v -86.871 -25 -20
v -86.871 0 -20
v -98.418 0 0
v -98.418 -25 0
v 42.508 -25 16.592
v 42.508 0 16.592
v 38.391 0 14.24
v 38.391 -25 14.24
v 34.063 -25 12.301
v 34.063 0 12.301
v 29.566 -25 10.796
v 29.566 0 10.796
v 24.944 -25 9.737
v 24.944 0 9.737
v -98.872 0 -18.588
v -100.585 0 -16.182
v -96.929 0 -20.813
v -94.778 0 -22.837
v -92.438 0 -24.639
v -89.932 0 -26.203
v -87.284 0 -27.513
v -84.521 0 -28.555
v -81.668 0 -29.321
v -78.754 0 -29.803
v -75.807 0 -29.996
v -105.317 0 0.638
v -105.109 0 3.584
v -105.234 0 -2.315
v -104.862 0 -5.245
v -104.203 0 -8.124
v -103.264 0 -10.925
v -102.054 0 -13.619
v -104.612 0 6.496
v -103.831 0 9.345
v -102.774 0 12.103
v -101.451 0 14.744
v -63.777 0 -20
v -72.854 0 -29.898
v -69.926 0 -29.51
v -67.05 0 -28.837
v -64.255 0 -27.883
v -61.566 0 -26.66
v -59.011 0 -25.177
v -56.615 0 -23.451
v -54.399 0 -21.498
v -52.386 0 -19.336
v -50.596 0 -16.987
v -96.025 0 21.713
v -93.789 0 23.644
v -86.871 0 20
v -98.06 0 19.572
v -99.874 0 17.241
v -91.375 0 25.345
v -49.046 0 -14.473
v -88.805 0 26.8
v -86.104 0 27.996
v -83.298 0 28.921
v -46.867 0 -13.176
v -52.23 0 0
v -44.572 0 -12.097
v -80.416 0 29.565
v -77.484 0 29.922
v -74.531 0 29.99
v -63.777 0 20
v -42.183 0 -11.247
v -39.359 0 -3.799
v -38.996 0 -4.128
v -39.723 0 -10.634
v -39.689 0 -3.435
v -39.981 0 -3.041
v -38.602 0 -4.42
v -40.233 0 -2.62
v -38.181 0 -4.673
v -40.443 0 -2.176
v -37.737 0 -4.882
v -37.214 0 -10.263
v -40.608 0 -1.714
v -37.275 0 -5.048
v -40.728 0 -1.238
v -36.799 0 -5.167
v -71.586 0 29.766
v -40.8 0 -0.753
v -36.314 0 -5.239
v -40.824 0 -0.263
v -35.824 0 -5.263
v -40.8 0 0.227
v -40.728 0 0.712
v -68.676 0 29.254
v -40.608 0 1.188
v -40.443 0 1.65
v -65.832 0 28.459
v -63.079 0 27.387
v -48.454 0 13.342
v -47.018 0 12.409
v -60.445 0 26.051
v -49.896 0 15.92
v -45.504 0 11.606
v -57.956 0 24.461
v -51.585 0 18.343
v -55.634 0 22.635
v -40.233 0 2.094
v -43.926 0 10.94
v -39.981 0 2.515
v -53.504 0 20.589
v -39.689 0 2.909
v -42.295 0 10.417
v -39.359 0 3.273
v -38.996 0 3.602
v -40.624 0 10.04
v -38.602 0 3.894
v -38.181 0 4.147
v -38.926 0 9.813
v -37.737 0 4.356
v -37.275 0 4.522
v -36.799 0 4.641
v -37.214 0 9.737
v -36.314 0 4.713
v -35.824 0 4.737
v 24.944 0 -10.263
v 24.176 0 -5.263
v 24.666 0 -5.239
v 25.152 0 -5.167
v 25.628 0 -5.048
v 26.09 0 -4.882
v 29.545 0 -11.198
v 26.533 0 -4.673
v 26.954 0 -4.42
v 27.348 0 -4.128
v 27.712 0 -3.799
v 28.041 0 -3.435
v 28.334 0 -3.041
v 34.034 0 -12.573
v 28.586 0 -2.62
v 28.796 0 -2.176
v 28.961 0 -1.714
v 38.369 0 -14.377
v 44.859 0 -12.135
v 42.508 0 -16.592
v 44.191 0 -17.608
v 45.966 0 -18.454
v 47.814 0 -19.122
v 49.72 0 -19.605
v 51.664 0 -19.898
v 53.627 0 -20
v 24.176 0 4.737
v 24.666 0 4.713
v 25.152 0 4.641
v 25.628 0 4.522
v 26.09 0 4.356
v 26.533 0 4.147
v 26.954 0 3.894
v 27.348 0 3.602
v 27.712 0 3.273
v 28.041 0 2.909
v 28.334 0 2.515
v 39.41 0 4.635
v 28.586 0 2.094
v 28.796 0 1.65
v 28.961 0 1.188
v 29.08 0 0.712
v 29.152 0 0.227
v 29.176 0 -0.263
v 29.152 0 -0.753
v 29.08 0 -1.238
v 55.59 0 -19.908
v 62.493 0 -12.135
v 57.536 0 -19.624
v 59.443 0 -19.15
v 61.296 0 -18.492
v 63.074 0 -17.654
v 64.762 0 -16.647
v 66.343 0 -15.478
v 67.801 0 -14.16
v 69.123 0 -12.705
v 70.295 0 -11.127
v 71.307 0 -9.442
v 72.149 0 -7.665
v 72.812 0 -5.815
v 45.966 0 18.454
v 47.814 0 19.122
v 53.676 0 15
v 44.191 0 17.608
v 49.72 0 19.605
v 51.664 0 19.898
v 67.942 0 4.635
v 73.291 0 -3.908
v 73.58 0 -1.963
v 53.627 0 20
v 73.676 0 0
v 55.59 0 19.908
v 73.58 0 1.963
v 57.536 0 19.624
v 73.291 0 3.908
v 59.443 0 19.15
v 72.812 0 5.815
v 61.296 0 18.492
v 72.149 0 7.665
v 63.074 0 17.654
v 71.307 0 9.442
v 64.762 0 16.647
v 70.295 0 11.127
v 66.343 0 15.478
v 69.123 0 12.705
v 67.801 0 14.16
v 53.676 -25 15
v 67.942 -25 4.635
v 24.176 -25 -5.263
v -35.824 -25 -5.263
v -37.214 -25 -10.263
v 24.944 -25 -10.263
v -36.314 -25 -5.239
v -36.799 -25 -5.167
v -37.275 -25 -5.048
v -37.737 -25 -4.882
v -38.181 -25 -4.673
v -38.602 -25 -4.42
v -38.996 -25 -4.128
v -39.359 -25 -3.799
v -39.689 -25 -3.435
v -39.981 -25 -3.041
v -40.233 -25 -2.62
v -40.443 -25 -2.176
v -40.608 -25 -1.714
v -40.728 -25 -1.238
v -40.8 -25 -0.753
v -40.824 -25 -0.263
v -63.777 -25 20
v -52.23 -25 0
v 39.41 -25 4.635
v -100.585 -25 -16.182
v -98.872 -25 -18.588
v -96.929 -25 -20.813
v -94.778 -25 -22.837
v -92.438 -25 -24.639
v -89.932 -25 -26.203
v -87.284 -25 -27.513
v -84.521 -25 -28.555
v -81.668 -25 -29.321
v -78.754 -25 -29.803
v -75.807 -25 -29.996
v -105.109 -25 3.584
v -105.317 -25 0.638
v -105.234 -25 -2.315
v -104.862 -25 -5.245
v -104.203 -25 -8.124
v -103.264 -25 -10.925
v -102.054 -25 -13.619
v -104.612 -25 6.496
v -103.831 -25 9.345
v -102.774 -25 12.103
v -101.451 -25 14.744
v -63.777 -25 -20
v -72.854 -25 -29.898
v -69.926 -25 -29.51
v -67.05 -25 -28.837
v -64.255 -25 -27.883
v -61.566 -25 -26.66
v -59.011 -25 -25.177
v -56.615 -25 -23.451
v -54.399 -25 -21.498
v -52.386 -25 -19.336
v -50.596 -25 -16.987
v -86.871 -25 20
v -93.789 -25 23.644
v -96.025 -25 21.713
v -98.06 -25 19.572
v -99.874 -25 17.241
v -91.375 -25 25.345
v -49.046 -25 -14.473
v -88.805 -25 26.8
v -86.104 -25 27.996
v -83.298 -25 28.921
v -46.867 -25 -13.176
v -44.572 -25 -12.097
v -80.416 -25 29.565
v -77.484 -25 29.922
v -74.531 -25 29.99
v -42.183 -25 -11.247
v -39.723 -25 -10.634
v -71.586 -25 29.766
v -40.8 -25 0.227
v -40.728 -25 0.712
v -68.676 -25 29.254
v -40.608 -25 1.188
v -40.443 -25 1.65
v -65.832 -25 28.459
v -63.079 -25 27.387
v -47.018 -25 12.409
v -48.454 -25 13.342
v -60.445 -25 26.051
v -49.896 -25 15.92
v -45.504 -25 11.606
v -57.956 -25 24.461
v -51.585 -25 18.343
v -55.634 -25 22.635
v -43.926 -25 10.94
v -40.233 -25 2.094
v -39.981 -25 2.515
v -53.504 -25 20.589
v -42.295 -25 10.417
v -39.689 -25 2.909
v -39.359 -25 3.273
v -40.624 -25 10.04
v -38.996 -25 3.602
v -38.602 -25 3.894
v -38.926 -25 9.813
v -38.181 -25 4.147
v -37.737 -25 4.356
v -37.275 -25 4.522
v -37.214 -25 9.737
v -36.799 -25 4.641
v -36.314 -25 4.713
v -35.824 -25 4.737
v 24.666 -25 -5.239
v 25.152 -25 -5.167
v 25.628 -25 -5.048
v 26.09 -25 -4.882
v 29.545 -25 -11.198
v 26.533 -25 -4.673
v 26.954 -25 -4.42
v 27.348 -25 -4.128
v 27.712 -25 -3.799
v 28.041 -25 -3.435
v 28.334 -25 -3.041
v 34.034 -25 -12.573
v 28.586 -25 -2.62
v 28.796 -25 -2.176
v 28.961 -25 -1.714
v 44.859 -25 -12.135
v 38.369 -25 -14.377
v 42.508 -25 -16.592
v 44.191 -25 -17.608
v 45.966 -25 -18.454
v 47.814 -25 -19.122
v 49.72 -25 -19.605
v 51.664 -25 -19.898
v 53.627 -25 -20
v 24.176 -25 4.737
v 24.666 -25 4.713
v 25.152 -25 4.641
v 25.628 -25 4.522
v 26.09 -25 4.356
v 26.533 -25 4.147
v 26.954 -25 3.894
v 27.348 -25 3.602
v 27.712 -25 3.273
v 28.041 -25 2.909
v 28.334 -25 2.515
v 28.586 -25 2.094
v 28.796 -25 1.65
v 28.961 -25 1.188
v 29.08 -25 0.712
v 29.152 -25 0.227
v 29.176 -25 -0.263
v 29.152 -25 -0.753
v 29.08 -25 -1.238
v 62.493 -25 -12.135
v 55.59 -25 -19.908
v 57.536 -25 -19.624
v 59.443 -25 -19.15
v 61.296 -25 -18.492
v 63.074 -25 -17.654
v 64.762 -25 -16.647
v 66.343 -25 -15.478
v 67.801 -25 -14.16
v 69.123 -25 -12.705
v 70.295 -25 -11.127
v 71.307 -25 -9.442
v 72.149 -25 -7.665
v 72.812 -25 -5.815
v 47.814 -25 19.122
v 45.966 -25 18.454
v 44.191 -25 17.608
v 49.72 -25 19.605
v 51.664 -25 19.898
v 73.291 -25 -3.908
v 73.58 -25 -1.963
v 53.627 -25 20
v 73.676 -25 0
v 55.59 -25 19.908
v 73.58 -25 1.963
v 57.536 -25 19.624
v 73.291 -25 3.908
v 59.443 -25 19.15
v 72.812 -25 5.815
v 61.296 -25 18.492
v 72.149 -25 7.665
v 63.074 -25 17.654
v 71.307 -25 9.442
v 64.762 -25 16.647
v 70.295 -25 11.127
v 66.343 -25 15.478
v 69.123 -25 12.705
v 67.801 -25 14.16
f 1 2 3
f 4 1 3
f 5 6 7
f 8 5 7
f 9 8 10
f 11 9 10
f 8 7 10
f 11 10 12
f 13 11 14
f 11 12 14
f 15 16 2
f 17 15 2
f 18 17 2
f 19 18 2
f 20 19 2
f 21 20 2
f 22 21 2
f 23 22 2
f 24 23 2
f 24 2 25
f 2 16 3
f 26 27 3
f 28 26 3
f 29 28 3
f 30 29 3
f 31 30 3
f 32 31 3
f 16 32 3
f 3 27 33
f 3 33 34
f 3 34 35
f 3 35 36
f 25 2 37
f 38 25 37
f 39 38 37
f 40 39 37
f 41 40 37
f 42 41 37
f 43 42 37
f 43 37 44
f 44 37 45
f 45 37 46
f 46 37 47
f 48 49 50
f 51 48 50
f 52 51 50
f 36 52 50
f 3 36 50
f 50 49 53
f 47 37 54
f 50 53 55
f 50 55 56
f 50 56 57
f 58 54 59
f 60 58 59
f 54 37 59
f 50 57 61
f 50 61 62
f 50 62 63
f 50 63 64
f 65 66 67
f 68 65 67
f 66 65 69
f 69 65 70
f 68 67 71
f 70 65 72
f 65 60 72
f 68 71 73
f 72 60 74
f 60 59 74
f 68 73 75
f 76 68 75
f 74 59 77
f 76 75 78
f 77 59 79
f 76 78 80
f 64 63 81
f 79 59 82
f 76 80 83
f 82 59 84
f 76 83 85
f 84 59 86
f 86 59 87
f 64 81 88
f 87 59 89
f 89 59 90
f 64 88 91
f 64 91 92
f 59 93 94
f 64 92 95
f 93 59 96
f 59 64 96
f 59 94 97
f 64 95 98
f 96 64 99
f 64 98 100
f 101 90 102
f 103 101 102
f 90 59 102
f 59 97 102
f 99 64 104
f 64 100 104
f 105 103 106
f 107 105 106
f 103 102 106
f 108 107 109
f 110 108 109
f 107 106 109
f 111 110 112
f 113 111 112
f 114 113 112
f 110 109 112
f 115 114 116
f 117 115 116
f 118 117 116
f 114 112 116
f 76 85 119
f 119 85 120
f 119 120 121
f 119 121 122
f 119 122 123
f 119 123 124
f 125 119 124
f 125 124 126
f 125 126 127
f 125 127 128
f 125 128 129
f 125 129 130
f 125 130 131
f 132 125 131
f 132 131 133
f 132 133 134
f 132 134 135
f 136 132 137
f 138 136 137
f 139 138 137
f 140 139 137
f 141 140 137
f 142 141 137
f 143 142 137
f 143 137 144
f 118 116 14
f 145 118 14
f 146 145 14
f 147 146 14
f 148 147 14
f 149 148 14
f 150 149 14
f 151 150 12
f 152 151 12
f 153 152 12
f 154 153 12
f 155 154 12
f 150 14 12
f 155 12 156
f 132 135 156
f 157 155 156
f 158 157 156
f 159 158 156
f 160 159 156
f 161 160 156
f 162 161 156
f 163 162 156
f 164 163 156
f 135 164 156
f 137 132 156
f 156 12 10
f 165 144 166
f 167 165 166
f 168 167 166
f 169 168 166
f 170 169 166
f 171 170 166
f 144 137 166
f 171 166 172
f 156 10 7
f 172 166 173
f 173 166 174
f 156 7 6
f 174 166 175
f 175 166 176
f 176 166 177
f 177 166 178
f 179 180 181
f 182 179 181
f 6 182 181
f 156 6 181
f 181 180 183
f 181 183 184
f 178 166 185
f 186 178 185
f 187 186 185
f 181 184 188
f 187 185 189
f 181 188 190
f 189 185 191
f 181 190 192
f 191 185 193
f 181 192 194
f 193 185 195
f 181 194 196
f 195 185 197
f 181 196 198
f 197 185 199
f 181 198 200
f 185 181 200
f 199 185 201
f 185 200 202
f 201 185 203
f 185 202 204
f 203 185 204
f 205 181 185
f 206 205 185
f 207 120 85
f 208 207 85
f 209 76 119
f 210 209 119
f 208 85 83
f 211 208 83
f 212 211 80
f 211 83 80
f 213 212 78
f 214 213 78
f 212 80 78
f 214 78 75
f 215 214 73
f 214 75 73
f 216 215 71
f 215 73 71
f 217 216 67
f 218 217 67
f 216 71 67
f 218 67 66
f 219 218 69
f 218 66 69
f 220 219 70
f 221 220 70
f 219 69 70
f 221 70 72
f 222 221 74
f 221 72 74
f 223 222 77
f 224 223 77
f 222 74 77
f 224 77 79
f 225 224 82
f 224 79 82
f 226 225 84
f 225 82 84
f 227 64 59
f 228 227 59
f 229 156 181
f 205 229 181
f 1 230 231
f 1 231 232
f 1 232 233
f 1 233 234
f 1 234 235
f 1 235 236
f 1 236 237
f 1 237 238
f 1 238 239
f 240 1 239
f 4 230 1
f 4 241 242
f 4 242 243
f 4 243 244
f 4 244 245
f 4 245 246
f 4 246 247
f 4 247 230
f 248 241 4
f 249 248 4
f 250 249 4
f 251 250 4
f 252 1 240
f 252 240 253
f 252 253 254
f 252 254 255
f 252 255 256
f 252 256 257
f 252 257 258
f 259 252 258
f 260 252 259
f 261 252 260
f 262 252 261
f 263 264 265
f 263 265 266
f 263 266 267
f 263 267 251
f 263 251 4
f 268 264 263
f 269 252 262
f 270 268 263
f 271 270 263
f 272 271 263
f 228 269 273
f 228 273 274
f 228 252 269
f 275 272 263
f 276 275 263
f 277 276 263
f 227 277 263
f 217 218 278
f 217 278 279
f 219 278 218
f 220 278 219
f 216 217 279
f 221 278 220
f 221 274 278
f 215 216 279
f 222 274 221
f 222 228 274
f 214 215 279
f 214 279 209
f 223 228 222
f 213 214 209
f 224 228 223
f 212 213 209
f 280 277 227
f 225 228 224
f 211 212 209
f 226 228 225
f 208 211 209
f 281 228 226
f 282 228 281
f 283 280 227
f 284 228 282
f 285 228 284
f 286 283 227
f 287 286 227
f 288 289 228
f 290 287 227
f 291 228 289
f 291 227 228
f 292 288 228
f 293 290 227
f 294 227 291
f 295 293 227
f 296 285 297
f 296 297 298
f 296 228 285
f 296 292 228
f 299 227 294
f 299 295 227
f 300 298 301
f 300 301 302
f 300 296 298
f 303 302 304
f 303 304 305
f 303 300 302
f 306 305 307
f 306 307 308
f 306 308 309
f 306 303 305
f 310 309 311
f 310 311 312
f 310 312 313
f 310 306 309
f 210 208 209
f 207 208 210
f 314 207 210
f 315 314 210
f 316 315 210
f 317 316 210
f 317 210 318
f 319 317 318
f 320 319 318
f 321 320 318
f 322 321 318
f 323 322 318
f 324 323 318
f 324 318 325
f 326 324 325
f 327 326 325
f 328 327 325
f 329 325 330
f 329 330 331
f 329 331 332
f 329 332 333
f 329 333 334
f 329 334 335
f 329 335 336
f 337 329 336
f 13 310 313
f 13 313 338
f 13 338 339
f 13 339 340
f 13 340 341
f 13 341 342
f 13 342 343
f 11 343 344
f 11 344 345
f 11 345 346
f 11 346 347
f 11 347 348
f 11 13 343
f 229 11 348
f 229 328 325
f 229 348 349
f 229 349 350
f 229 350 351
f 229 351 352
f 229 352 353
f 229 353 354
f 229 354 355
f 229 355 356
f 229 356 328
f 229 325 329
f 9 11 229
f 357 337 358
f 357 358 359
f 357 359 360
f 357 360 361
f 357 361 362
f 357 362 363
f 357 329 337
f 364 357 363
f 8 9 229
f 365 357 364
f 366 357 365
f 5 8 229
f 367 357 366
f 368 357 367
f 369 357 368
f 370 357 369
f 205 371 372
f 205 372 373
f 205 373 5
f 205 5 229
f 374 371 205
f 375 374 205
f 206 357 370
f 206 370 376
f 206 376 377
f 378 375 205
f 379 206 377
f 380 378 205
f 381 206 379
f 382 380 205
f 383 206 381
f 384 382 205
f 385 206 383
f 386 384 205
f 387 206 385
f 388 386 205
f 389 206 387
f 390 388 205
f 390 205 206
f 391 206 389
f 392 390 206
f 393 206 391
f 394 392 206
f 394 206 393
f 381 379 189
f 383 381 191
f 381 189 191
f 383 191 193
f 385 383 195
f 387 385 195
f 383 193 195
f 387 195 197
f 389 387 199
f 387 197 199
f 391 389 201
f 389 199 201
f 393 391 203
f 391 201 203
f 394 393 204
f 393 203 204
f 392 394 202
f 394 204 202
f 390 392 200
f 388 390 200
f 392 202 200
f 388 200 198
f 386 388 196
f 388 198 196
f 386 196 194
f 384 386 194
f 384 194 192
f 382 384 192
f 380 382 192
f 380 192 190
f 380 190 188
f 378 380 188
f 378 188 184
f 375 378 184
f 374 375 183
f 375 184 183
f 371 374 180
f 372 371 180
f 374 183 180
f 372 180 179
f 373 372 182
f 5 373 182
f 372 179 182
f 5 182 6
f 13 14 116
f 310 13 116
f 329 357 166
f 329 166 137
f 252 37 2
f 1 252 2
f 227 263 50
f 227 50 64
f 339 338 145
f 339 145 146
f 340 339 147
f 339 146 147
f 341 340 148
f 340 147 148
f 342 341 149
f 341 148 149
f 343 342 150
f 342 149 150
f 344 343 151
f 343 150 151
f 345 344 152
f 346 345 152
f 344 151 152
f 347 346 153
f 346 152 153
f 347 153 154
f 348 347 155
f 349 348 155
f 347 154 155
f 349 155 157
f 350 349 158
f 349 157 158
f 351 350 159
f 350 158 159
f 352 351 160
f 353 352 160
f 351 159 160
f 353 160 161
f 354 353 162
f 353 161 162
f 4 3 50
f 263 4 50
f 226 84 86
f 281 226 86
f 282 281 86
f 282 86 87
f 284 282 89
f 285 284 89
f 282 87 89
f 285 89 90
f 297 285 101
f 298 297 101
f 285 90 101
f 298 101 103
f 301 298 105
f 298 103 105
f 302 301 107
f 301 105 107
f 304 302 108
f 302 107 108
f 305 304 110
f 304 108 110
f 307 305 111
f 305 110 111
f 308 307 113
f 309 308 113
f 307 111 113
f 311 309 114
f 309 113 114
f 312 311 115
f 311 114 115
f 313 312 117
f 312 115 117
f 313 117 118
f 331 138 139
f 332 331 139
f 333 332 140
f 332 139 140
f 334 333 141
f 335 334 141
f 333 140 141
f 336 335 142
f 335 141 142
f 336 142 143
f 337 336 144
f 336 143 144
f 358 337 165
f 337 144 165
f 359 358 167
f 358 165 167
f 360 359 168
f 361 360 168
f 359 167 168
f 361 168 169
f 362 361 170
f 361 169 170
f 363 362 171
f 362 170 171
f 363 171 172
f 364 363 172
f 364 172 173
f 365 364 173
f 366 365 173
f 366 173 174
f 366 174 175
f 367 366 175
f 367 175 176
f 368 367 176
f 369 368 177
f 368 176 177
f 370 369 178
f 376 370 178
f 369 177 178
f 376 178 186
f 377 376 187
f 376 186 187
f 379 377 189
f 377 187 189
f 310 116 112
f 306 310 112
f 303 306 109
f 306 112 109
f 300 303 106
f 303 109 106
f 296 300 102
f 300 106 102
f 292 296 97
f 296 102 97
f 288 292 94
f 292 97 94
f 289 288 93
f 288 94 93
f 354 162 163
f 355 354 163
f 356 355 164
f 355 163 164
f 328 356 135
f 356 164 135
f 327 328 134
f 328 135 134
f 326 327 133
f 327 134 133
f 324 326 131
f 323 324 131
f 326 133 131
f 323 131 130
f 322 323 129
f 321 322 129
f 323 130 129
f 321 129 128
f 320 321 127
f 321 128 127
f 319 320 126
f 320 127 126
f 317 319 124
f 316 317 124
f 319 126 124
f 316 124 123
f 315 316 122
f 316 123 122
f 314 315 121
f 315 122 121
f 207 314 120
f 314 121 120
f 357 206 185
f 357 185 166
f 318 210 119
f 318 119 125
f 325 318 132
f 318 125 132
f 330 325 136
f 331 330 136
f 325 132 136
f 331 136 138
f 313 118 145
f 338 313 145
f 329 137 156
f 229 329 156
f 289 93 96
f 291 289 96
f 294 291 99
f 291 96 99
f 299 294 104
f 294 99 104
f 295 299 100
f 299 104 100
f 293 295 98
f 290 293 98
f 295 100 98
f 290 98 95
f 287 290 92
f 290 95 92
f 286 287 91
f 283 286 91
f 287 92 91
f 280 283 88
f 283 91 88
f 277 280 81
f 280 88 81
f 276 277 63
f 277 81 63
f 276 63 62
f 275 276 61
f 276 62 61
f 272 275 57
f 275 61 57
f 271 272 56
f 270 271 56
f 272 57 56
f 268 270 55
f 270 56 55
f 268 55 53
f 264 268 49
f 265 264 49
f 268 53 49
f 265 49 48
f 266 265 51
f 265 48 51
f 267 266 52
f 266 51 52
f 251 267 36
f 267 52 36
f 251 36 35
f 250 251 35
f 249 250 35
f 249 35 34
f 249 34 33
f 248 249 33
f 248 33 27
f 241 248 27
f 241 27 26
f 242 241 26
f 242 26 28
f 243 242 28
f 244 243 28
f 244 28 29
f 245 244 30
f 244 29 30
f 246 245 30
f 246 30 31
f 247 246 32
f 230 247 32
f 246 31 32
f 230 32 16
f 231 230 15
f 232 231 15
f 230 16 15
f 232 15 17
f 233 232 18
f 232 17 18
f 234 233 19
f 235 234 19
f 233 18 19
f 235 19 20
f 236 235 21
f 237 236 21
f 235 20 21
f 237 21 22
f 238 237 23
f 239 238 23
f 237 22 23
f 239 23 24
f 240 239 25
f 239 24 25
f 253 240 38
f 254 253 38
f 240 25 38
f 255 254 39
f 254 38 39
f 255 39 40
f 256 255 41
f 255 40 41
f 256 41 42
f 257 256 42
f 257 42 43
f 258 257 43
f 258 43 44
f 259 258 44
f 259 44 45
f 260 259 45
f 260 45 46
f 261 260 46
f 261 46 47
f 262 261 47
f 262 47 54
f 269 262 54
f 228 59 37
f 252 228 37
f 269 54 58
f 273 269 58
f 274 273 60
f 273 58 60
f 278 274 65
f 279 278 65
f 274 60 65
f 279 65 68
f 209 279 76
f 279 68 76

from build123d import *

# Parameters (mm, degrees)
F1_DEPTH = 25


with BuildPart() as f1:
    # F0 (on Front) → F1 (new body)
    with BuildSketch(Plane.XZ):
        with BuildLine():
            ThreePointArc((-49.045524, -14.472526), (-46.269099, -7.471705), (-45.323765, 0))
            ThreePointArc((-45.323765, 0), (-46.116799, 6.852234), (-48.453973, 13.342198))
            ThreePointArc((-48.453973, 13.342198), (-105.316983, 0.637882), (-49.045524, -14.472526))
        make_face()
        Polygon((-98.417776, 0), (-86.870771, 20), (-63.77676, 20), (-52.229754, 0), (-63.77676, -20), (-86.870771, -20), align=None, mode=Mode.SUBTRACT)
        with BuildLine():
            ThreePointArc((-48.453973, 13.342198), (-46.116799, 6.852234), (-45.323765, 0))
            ThreePointArc((-45.323765, 0), (-46.269099, -7.471705), (-49.045524, -14.472526))
            ThreePointArc((-49.045524, -14.472526), (-43.387683, -11.643077), (-37.214165, -10.262998))
            Line((-37.214165, -10.262998), (24.944222, -10.262998))
            ThreePointArc((24.944222, -10.262998), (34.03408, -12.573077), (42.50839, -16.591542))
            ThreePointArc((42.50839, -16.591542), (33.676235, 0), (42.50839, 16.591542))
            ThreePointArc((42.50839, 16.591542), (34.063025, 12.301459), (24.944222, 9.737002))
            Line((24.944222, 9.737002), (-37.214165, 9.737002))
            ThreePointArc((-37.214165, 9.737002), (-43.116087, 10.660362), (-48.453973, 13.342198))
        make_face()
        with BuildLine():
            ThreePointArc((-40.823765, -0.262998), (-39.359299, 3.272535), (-35.823765, 4.737002))
            Line((-35.823765, 4.737002), (24.176235, 4.737002))
            ThreePointArc((24.176235, 4.737002), (27.711769, 3.272535), (29.176235, -0.262998))
            ThreePointArc((29.176235, -0.262998), (27.711769, -3.798532), (24.176235, -5.262998))
            Line((24.176235, -5.262998), (-35.823765, -5.262998))
            ThreePointArc((-35.823765, -5.262998), (-39.359299, -3.798532), (-40.823765, -0.262998))
        make_face(mode=Mode.SUBTRACT)
        with BuildLine():
            ThreePointArc((73.676235, 0), (63.07419, 17.654417), (42.50839, 16.591542))
            ThreePointArc((42.50839, 16.591542), (33.676235, 0), (42.50839, -16.591542))
            ThreePointArc((42.50839, -16.591542), (63.07419, -17.654417), (73.676235, 0))
        make_face()
        Polygon((53.676235, 15), (67.942083, 4.635255), (62.493014, -12.135255), (44.859456, -12.135255), (39.410387, 4.635255), align=None, mode=Mode.SUBTRACT)
    extrude(amount=F1_DEPTH)


solid = f1.part
